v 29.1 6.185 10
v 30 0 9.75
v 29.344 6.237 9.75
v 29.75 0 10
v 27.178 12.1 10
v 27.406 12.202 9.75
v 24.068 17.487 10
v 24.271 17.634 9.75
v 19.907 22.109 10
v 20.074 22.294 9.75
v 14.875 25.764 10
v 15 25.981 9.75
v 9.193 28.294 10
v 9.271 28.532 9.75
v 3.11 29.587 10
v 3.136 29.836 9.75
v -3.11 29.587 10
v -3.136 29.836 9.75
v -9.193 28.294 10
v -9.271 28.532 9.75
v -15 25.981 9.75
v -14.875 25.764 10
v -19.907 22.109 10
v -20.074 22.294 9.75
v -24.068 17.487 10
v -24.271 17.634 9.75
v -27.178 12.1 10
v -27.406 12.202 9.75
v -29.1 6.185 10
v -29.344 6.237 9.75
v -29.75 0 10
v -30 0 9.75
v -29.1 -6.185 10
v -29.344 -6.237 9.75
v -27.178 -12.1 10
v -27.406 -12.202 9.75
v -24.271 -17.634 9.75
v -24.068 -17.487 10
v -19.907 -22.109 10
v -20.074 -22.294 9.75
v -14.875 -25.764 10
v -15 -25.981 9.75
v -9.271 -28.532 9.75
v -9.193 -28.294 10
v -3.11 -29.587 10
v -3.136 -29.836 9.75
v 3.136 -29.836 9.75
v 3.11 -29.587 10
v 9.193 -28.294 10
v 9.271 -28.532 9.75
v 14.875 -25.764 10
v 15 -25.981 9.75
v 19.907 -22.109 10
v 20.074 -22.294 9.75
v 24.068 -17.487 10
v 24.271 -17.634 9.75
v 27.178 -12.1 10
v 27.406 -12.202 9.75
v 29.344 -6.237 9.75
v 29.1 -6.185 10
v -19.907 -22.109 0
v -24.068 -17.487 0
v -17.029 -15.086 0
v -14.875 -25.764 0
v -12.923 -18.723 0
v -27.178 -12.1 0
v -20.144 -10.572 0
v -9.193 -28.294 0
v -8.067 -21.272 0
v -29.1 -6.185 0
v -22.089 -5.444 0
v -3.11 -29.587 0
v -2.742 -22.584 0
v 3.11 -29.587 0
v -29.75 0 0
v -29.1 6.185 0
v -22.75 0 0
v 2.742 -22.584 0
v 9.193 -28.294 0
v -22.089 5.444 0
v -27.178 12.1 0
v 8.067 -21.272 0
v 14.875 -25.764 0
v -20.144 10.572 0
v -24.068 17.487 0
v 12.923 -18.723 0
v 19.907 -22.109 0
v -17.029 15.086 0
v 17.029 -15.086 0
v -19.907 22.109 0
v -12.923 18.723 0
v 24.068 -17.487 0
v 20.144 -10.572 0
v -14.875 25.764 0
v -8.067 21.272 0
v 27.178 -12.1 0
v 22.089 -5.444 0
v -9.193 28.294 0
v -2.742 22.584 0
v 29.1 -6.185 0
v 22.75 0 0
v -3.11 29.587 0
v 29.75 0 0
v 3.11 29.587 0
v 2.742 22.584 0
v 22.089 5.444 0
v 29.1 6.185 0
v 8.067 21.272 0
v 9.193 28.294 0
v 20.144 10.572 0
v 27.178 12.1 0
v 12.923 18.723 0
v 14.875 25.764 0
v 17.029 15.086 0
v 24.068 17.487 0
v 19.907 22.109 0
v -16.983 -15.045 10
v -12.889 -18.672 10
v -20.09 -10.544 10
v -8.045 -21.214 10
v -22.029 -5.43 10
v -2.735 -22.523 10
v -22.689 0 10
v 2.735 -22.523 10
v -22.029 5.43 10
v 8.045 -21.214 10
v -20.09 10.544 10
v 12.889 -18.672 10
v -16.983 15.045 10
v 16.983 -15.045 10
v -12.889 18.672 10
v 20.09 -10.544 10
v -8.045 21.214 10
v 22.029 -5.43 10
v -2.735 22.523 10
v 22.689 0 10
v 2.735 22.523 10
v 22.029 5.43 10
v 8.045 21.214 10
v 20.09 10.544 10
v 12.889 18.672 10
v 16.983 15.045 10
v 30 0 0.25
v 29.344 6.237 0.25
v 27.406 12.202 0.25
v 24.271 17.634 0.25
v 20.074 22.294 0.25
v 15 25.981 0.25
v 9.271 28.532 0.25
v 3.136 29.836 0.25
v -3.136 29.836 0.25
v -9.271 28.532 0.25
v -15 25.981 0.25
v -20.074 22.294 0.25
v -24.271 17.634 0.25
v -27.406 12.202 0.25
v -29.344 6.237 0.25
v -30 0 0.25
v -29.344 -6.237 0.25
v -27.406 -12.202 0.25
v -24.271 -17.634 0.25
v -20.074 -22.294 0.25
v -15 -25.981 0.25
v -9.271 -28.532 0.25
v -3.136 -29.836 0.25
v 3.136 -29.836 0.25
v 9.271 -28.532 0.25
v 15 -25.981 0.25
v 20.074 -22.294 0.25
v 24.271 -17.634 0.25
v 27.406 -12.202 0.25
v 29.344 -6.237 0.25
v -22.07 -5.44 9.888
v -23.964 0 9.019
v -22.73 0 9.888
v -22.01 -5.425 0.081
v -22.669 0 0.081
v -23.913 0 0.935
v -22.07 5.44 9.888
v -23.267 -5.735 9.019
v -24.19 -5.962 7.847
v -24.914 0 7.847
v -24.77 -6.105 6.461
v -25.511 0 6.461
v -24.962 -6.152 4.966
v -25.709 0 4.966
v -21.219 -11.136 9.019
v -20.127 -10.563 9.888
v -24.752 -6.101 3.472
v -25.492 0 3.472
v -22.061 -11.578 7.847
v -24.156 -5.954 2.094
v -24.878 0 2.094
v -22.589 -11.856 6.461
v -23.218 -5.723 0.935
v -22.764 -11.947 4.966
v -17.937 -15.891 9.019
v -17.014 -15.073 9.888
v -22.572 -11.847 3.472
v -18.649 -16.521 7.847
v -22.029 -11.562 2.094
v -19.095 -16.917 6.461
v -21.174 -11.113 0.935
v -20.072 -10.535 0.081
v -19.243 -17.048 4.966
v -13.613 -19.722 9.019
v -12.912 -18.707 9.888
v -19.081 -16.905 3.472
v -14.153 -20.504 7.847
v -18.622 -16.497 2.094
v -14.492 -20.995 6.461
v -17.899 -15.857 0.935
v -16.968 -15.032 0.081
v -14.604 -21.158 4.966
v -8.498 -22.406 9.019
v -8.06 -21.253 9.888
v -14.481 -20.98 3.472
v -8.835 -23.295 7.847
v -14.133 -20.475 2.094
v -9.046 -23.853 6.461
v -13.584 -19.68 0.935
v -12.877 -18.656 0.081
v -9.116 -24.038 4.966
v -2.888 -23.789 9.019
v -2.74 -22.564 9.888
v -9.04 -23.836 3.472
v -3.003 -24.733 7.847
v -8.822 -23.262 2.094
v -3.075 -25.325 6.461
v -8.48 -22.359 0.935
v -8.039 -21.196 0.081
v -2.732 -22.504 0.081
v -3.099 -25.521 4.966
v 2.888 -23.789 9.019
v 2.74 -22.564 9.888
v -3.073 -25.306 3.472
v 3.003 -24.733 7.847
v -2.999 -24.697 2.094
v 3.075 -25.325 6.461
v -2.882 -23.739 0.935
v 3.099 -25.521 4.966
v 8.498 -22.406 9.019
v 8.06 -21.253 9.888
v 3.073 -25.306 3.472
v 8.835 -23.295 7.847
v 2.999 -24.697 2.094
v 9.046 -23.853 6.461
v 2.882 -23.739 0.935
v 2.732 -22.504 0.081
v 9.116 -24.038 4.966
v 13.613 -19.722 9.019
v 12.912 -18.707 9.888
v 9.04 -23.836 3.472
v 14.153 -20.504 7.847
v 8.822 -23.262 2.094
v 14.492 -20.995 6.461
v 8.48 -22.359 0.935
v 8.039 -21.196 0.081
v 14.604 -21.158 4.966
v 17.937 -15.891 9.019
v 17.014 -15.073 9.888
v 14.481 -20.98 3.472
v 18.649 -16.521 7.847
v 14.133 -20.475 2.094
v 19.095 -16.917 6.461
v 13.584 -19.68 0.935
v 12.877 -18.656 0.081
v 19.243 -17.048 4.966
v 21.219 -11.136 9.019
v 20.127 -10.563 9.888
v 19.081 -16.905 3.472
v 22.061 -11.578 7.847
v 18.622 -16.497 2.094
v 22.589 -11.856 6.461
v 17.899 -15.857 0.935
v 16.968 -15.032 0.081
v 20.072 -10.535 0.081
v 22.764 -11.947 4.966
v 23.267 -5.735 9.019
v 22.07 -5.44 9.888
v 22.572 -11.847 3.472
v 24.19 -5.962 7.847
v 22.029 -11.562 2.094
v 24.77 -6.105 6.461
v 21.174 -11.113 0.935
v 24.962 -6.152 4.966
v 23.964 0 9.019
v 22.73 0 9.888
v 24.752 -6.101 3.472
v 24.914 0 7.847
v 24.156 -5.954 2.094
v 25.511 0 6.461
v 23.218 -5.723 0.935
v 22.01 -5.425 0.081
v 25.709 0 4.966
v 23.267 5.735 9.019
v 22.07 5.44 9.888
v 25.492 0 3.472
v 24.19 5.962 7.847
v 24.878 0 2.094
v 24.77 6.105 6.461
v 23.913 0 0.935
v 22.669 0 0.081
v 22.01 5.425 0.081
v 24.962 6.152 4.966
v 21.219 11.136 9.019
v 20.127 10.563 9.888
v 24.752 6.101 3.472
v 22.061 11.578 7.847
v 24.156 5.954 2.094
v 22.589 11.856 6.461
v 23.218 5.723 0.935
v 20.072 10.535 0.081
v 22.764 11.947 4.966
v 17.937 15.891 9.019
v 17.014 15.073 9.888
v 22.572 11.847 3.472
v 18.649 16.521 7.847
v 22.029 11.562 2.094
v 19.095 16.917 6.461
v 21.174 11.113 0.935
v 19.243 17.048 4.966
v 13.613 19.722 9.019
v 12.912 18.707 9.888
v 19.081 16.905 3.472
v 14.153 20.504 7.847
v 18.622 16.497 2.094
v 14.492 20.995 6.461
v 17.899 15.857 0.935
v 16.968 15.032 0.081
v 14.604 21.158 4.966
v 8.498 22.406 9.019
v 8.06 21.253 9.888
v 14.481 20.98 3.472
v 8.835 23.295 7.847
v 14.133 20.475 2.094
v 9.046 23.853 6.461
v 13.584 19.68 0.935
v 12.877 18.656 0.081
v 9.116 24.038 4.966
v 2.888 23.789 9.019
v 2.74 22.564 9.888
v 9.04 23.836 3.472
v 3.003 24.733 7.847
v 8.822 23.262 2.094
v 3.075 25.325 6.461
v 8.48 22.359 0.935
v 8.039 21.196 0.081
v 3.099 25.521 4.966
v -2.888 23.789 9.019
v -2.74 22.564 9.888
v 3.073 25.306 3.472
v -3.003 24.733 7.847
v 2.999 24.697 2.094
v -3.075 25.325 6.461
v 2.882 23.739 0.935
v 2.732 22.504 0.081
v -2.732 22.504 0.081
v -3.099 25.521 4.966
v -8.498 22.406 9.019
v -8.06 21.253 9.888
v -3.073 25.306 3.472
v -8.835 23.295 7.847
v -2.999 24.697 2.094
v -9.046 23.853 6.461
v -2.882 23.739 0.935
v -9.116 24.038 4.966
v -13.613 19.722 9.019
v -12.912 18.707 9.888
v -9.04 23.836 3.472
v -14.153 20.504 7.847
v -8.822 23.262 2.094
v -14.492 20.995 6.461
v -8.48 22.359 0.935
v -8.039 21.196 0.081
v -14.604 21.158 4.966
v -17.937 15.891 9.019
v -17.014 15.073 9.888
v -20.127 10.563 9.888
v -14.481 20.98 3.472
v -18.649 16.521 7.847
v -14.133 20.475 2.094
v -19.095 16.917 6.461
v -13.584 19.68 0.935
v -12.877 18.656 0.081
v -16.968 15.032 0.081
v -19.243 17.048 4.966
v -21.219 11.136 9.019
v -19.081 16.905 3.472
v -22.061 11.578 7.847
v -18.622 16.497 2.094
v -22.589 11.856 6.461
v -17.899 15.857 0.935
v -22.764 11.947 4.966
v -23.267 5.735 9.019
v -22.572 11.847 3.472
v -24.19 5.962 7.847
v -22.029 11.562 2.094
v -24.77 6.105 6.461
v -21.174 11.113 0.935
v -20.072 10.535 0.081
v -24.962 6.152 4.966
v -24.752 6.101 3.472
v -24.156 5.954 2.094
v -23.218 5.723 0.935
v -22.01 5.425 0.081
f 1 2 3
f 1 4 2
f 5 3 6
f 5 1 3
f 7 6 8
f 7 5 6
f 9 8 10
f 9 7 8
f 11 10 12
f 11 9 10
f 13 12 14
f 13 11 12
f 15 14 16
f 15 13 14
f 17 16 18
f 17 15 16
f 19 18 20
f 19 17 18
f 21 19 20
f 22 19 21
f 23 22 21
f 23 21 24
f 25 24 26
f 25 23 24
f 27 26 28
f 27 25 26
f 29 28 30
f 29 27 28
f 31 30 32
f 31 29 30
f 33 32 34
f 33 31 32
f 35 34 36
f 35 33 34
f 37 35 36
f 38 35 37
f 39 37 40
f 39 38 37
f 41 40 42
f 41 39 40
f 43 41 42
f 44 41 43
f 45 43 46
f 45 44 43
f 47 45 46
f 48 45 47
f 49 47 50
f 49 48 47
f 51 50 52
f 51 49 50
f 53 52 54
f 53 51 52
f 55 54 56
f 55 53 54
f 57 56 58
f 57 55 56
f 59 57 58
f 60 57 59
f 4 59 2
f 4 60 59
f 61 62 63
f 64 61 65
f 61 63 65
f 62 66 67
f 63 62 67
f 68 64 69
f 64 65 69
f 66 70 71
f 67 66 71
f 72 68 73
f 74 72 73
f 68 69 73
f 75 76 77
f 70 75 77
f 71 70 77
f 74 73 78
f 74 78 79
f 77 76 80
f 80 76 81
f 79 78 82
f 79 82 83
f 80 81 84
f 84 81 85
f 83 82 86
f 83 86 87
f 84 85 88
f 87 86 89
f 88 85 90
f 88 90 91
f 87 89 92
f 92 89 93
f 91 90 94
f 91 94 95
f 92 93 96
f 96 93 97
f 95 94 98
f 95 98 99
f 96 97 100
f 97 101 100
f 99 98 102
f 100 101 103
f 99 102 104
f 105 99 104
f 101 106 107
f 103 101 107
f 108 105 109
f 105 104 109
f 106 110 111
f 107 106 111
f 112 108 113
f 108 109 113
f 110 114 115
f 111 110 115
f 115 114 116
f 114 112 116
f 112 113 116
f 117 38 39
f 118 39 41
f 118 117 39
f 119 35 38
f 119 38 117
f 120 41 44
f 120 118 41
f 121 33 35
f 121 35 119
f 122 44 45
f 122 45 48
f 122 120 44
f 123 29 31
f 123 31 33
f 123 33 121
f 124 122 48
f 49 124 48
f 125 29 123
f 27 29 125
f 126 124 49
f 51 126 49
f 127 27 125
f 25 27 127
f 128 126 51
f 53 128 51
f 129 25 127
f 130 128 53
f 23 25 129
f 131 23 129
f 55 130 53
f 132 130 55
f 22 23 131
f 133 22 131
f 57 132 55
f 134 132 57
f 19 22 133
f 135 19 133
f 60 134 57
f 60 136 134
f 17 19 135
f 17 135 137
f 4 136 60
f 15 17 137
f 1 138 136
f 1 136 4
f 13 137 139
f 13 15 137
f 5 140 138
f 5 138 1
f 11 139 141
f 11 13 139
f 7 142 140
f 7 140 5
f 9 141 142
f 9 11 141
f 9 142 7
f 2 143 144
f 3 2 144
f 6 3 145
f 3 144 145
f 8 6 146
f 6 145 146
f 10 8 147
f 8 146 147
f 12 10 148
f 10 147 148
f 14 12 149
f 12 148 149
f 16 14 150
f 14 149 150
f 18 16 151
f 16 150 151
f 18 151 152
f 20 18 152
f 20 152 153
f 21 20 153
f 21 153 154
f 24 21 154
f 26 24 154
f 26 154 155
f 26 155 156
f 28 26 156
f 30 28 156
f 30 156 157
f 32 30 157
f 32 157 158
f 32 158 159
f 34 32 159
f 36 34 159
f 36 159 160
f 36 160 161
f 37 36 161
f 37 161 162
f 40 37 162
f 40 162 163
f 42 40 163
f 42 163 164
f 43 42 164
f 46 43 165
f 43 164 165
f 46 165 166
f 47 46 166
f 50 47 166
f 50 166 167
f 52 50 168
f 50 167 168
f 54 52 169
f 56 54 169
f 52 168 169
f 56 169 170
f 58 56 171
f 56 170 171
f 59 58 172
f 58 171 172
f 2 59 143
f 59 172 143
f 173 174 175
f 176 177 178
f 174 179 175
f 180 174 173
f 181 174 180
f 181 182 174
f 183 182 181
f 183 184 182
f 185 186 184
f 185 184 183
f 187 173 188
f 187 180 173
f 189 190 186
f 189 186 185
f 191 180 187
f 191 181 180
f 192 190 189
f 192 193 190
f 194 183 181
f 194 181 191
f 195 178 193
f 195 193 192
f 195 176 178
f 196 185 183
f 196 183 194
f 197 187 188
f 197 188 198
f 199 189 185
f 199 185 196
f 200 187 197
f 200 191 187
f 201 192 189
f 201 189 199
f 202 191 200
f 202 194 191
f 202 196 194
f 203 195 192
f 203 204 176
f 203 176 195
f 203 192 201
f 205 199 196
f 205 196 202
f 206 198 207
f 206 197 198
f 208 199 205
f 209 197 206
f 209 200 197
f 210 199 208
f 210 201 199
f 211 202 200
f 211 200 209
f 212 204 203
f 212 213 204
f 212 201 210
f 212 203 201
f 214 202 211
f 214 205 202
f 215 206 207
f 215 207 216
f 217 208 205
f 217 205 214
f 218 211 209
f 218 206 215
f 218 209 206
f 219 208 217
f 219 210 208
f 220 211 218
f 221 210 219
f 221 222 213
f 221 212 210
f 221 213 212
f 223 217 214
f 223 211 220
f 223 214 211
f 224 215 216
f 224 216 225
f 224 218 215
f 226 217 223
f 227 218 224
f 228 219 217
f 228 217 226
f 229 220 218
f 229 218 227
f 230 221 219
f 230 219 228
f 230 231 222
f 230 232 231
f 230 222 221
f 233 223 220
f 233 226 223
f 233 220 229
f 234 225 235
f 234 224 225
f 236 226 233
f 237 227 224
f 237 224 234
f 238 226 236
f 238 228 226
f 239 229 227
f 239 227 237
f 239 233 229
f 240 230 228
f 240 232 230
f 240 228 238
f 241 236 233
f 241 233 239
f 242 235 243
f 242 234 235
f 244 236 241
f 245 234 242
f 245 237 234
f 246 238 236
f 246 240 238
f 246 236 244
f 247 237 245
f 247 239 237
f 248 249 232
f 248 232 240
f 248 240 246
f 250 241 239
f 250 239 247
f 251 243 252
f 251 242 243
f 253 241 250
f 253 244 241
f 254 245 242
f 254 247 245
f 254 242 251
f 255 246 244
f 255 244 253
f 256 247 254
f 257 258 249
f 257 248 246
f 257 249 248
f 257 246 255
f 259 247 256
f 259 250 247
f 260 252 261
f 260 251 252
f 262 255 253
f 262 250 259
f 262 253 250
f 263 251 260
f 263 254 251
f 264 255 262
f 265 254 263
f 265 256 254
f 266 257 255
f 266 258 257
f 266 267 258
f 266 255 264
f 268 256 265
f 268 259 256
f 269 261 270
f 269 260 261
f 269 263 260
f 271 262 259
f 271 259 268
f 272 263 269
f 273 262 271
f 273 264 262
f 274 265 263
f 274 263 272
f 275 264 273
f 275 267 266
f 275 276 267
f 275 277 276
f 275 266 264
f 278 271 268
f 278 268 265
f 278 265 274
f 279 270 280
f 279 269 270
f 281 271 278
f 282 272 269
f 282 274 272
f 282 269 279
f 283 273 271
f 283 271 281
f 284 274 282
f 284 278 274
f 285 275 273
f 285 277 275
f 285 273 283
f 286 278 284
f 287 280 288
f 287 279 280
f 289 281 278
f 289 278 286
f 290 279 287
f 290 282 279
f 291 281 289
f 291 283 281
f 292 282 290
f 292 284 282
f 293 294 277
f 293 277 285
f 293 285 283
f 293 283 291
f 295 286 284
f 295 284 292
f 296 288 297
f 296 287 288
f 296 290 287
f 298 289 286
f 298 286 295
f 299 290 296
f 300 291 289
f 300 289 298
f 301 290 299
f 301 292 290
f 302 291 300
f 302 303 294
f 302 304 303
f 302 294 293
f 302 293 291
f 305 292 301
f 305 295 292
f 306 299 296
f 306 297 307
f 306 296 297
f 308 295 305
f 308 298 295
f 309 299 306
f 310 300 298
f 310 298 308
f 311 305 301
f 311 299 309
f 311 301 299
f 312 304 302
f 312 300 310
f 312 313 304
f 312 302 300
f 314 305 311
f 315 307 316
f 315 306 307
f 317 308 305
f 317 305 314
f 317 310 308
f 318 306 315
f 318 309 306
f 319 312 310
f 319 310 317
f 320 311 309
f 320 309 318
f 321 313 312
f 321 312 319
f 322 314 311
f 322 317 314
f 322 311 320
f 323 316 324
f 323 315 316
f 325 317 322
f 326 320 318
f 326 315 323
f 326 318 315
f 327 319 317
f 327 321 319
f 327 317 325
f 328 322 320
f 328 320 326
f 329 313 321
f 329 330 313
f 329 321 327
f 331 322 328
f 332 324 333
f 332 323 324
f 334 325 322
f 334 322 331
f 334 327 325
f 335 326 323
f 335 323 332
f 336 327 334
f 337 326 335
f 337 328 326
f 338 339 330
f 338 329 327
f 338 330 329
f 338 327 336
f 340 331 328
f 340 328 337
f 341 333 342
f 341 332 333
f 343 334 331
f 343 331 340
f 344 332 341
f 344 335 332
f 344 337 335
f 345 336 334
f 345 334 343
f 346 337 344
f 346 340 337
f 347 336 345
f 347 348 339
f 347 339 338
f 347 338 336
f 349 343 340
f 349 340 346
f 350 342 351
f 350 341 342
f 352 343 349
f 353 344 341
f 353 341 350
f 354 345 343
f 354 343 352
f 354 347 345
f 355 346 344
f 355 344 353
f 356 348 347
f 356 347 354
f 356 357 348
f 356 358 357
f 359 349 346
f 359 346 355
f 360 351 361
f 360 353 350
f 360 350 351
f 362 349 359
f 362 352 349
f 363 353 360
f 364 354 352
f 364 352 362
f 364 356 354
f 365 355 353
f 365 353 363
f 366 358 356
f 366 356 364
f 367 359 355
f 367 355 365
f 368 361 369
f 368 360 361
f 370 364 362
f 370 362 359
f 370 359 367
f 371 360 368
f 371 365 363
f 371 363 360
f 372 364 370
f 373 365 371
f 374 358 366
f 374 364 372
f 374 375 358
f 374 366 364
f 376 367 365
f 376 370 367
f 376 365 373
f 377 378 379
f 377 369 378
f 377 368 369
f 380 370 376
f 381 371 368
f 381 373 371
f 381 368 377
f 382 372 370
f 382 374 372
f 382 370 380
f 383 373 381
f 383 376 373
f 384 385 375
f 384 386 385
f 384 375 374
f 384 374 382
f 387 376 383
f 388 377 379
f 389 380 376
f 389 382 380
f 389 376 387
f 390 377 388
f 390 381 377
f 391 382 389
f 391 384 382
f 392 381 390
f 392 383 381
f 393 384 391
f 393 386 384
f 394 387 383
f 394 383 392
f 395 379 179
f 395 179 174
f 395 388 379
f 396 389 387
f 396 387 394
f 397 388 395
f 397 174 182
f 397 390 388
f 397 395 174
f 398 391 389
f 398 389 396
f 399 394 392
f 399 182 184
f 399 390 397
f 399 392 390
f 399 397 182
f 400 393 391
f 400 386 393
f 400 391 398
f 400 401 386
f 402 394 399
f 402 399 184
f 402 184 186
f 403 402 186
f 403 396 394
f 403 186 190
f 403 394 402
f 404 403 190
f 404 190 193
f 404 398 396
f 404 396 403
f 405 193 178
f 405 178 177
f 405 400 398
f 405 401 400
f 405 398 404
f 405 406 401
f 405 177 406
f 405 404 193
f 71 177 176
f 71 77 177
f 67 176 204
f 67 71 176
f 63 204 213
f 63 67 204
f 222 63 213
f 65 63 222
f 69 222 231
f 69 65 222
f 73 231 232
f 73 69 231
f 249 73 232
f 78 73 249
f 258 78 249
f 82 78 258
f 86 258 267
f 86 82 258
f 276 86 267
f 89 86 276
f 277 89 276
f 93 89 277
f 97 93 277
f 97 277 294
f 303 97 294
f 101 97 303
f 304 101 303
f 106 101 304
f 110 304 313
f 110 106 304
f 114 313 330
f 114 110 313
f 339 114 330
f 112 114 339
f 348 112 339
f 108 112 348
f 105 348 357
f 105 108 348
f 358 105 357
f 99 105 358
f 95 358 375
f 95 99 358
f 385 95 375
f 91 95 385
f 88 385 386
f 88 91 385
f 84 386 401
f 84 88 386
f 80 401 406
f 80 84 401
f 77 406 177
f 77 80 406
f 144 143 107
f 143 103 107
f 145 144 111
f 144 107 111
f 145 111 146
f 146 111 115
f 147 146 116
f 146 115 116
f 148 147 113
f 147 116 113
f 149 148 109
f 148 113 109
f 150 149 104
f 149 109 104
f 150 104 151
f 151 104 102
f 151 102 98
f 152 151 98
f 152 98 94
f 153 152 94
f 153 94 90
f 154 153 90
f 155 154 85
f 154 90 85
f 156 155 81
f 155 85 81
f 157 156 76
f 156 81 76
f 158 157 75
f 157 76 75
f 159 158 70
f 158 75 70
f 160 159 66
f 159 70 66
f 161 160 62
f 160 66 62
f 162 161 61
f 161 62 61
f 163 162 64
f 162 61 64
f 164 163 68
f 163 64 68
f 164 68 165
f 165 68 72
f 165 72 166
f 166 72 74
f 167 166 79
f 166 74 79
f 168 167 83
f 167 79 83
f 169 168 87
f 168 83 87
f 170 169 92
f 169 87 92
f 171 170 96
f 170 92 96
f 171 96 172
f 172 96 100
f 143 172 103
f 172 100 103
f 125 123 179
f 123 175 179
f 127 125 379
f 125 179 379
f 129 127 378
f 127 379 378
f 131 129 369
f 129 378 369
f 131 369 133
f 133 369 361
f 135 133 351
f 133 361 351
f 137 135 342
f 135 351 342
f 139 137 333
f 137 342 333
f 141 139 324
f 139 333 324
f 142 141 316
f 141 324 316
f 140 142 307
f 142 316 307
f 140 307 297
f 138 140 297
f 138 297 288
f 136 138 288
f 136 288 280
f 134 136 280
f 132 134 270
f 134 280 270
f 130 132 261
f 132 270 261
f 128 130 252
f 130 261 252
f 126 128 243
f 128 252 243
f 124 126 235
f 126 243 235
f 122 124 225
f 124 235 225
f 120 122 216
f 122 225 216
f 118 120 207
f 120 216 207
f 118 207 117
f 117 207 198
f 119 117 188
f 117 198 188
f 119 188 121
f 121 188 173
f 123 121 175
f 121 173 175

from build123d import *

# Parameters (mm, degrees)
SKETCH1_R                         = 30
BEARING_DIAMETER_DEPTH            = 10
BEARING_INNER_DIAMETER_DEPTH      = 44.588989435
BEARING_INNER_DIAMETER_DEPTH_BACK = 44.588989435
SKETCH2_R                         = 22.5
CHAMFER1_SIZE                     = 0.25
CHAMFER1_SIZE_2                   = 0.188581226


with BuildPart() as part:
    # Sketch1 → Bearing Diameter (new body)
    with BuildSketch(Plane.XY):
        Circle(SKETCH1_R)
    extrude(amount=BEARING_DIAMETER_DEPTH)

    # Sketch2 → Bearing Inner Diameter (cut, two sides: drawn at the far end of the back side and taken through both)
    with BuildSketch(Plane.XY.offset(10).offset(-BEARING_INNER_DIAMETER_DEPTH_BACK)):
        Circle(SKETCH2_R)
    extrude(amount=BEARING_INNER_DIAMETER_DEPTH + BEARING_INNER_DIAMETER_DEPTH_BACK, mode=Mode.SUBTRACT)

    # Sketch3 → Cut-Revolve2 (revolve, cut)
    with BuildSketch(Plane(origin=(0, 0, 0), x_dir=(1, 0, 0), z_dir=(0, 1, 0))):
        with BuildLine():
            Line((-22.5, 0), (-22.5, -10))
            ThreePointArc((-22.5, -10), (-25.708712153, -5), (-22.5, 0))
        make_face()
    revolve(axis=Axis((0, 0, 0), (0, 0, 1)), mode=Mode.SUBTRACT)

    # Chamfer1
    # the kernel refuses this chamfer: 0.25, 0.188581226 mm, written as the material it takes off along each edge
    with BuildSketch(Plane(origin=(0, 0, 0), x_dir=(-1, 0, 0), z_dir=(0, 1, 0))) as chamfer1_piece_1:
        with BuildLine():
            Line((22.669028641, 0.080971359), (22.5 + CHAMFER1_SIZE, 0))
            Line((22.5 + CHAMFER1_SIZE, 0), (22.5, 0))
            ThreePointArc((22.5, 0), (22.583359545, 0.039047495), (22.669028641, 0.080971359))
        make_face()
    revolve(axis=Axis((0, 0, 0), (0, 0, 1)), mode=Mode.SUBTRACT)
    with BuildSketch(Plane(origin=(0, 0, 10), x_dir=(-1, 0, 0), z_dir=(0, -1, 0))) as chamfer1_piece_2:
        with BuildLine():
            Line((22.5 + CHAMFER1_SIZE_2 * 0.999999998985, 0), (22.730207565, 0.112049419))
            ThreePointArc((22.730207565, 0.112049419), (22.619010369, 0.056270385), (22.5, 0))
            Line((22.5, 0), (22.5 + CHAMFER1_SIZE_2 * 0.999999998985, 0))
        make_face()
    revolve(axis=Axis((0, 0, 10), (0, 0, -1)), mode=Mode.SUBTRACT)
    with BuildSketch(Plane(origin=(0, 0, 0), x_dir=(1, 0, 0), z_dir=(0, -1, 0))) as chamfer1_piece_3:
        Polygon((30, CHAMFER1_SIZE), (30 - CHAMFER1_SIZE, 0), (30, 0), align=None)
    revolve(axis=Axis((0, 0, 0), (0, 0, 1)), mode=Mode.SUBTRACT)
    with BuildSketch(Plane(origin=(0, 0, 10), x_dir=(1, 0, 0), z_dir=(0, -1, 0))) as chamfer1_piece_4:
        Polygon((30, -CHAMFER1_SIZE), (30 - CHAMFER1_SIZE, 0), (30, 0), align=None)
    revolve(axis=Axis((0, 0, 10), (0, 0, 1)), mode=Mode.SUBTRACT)


solid = part.part
